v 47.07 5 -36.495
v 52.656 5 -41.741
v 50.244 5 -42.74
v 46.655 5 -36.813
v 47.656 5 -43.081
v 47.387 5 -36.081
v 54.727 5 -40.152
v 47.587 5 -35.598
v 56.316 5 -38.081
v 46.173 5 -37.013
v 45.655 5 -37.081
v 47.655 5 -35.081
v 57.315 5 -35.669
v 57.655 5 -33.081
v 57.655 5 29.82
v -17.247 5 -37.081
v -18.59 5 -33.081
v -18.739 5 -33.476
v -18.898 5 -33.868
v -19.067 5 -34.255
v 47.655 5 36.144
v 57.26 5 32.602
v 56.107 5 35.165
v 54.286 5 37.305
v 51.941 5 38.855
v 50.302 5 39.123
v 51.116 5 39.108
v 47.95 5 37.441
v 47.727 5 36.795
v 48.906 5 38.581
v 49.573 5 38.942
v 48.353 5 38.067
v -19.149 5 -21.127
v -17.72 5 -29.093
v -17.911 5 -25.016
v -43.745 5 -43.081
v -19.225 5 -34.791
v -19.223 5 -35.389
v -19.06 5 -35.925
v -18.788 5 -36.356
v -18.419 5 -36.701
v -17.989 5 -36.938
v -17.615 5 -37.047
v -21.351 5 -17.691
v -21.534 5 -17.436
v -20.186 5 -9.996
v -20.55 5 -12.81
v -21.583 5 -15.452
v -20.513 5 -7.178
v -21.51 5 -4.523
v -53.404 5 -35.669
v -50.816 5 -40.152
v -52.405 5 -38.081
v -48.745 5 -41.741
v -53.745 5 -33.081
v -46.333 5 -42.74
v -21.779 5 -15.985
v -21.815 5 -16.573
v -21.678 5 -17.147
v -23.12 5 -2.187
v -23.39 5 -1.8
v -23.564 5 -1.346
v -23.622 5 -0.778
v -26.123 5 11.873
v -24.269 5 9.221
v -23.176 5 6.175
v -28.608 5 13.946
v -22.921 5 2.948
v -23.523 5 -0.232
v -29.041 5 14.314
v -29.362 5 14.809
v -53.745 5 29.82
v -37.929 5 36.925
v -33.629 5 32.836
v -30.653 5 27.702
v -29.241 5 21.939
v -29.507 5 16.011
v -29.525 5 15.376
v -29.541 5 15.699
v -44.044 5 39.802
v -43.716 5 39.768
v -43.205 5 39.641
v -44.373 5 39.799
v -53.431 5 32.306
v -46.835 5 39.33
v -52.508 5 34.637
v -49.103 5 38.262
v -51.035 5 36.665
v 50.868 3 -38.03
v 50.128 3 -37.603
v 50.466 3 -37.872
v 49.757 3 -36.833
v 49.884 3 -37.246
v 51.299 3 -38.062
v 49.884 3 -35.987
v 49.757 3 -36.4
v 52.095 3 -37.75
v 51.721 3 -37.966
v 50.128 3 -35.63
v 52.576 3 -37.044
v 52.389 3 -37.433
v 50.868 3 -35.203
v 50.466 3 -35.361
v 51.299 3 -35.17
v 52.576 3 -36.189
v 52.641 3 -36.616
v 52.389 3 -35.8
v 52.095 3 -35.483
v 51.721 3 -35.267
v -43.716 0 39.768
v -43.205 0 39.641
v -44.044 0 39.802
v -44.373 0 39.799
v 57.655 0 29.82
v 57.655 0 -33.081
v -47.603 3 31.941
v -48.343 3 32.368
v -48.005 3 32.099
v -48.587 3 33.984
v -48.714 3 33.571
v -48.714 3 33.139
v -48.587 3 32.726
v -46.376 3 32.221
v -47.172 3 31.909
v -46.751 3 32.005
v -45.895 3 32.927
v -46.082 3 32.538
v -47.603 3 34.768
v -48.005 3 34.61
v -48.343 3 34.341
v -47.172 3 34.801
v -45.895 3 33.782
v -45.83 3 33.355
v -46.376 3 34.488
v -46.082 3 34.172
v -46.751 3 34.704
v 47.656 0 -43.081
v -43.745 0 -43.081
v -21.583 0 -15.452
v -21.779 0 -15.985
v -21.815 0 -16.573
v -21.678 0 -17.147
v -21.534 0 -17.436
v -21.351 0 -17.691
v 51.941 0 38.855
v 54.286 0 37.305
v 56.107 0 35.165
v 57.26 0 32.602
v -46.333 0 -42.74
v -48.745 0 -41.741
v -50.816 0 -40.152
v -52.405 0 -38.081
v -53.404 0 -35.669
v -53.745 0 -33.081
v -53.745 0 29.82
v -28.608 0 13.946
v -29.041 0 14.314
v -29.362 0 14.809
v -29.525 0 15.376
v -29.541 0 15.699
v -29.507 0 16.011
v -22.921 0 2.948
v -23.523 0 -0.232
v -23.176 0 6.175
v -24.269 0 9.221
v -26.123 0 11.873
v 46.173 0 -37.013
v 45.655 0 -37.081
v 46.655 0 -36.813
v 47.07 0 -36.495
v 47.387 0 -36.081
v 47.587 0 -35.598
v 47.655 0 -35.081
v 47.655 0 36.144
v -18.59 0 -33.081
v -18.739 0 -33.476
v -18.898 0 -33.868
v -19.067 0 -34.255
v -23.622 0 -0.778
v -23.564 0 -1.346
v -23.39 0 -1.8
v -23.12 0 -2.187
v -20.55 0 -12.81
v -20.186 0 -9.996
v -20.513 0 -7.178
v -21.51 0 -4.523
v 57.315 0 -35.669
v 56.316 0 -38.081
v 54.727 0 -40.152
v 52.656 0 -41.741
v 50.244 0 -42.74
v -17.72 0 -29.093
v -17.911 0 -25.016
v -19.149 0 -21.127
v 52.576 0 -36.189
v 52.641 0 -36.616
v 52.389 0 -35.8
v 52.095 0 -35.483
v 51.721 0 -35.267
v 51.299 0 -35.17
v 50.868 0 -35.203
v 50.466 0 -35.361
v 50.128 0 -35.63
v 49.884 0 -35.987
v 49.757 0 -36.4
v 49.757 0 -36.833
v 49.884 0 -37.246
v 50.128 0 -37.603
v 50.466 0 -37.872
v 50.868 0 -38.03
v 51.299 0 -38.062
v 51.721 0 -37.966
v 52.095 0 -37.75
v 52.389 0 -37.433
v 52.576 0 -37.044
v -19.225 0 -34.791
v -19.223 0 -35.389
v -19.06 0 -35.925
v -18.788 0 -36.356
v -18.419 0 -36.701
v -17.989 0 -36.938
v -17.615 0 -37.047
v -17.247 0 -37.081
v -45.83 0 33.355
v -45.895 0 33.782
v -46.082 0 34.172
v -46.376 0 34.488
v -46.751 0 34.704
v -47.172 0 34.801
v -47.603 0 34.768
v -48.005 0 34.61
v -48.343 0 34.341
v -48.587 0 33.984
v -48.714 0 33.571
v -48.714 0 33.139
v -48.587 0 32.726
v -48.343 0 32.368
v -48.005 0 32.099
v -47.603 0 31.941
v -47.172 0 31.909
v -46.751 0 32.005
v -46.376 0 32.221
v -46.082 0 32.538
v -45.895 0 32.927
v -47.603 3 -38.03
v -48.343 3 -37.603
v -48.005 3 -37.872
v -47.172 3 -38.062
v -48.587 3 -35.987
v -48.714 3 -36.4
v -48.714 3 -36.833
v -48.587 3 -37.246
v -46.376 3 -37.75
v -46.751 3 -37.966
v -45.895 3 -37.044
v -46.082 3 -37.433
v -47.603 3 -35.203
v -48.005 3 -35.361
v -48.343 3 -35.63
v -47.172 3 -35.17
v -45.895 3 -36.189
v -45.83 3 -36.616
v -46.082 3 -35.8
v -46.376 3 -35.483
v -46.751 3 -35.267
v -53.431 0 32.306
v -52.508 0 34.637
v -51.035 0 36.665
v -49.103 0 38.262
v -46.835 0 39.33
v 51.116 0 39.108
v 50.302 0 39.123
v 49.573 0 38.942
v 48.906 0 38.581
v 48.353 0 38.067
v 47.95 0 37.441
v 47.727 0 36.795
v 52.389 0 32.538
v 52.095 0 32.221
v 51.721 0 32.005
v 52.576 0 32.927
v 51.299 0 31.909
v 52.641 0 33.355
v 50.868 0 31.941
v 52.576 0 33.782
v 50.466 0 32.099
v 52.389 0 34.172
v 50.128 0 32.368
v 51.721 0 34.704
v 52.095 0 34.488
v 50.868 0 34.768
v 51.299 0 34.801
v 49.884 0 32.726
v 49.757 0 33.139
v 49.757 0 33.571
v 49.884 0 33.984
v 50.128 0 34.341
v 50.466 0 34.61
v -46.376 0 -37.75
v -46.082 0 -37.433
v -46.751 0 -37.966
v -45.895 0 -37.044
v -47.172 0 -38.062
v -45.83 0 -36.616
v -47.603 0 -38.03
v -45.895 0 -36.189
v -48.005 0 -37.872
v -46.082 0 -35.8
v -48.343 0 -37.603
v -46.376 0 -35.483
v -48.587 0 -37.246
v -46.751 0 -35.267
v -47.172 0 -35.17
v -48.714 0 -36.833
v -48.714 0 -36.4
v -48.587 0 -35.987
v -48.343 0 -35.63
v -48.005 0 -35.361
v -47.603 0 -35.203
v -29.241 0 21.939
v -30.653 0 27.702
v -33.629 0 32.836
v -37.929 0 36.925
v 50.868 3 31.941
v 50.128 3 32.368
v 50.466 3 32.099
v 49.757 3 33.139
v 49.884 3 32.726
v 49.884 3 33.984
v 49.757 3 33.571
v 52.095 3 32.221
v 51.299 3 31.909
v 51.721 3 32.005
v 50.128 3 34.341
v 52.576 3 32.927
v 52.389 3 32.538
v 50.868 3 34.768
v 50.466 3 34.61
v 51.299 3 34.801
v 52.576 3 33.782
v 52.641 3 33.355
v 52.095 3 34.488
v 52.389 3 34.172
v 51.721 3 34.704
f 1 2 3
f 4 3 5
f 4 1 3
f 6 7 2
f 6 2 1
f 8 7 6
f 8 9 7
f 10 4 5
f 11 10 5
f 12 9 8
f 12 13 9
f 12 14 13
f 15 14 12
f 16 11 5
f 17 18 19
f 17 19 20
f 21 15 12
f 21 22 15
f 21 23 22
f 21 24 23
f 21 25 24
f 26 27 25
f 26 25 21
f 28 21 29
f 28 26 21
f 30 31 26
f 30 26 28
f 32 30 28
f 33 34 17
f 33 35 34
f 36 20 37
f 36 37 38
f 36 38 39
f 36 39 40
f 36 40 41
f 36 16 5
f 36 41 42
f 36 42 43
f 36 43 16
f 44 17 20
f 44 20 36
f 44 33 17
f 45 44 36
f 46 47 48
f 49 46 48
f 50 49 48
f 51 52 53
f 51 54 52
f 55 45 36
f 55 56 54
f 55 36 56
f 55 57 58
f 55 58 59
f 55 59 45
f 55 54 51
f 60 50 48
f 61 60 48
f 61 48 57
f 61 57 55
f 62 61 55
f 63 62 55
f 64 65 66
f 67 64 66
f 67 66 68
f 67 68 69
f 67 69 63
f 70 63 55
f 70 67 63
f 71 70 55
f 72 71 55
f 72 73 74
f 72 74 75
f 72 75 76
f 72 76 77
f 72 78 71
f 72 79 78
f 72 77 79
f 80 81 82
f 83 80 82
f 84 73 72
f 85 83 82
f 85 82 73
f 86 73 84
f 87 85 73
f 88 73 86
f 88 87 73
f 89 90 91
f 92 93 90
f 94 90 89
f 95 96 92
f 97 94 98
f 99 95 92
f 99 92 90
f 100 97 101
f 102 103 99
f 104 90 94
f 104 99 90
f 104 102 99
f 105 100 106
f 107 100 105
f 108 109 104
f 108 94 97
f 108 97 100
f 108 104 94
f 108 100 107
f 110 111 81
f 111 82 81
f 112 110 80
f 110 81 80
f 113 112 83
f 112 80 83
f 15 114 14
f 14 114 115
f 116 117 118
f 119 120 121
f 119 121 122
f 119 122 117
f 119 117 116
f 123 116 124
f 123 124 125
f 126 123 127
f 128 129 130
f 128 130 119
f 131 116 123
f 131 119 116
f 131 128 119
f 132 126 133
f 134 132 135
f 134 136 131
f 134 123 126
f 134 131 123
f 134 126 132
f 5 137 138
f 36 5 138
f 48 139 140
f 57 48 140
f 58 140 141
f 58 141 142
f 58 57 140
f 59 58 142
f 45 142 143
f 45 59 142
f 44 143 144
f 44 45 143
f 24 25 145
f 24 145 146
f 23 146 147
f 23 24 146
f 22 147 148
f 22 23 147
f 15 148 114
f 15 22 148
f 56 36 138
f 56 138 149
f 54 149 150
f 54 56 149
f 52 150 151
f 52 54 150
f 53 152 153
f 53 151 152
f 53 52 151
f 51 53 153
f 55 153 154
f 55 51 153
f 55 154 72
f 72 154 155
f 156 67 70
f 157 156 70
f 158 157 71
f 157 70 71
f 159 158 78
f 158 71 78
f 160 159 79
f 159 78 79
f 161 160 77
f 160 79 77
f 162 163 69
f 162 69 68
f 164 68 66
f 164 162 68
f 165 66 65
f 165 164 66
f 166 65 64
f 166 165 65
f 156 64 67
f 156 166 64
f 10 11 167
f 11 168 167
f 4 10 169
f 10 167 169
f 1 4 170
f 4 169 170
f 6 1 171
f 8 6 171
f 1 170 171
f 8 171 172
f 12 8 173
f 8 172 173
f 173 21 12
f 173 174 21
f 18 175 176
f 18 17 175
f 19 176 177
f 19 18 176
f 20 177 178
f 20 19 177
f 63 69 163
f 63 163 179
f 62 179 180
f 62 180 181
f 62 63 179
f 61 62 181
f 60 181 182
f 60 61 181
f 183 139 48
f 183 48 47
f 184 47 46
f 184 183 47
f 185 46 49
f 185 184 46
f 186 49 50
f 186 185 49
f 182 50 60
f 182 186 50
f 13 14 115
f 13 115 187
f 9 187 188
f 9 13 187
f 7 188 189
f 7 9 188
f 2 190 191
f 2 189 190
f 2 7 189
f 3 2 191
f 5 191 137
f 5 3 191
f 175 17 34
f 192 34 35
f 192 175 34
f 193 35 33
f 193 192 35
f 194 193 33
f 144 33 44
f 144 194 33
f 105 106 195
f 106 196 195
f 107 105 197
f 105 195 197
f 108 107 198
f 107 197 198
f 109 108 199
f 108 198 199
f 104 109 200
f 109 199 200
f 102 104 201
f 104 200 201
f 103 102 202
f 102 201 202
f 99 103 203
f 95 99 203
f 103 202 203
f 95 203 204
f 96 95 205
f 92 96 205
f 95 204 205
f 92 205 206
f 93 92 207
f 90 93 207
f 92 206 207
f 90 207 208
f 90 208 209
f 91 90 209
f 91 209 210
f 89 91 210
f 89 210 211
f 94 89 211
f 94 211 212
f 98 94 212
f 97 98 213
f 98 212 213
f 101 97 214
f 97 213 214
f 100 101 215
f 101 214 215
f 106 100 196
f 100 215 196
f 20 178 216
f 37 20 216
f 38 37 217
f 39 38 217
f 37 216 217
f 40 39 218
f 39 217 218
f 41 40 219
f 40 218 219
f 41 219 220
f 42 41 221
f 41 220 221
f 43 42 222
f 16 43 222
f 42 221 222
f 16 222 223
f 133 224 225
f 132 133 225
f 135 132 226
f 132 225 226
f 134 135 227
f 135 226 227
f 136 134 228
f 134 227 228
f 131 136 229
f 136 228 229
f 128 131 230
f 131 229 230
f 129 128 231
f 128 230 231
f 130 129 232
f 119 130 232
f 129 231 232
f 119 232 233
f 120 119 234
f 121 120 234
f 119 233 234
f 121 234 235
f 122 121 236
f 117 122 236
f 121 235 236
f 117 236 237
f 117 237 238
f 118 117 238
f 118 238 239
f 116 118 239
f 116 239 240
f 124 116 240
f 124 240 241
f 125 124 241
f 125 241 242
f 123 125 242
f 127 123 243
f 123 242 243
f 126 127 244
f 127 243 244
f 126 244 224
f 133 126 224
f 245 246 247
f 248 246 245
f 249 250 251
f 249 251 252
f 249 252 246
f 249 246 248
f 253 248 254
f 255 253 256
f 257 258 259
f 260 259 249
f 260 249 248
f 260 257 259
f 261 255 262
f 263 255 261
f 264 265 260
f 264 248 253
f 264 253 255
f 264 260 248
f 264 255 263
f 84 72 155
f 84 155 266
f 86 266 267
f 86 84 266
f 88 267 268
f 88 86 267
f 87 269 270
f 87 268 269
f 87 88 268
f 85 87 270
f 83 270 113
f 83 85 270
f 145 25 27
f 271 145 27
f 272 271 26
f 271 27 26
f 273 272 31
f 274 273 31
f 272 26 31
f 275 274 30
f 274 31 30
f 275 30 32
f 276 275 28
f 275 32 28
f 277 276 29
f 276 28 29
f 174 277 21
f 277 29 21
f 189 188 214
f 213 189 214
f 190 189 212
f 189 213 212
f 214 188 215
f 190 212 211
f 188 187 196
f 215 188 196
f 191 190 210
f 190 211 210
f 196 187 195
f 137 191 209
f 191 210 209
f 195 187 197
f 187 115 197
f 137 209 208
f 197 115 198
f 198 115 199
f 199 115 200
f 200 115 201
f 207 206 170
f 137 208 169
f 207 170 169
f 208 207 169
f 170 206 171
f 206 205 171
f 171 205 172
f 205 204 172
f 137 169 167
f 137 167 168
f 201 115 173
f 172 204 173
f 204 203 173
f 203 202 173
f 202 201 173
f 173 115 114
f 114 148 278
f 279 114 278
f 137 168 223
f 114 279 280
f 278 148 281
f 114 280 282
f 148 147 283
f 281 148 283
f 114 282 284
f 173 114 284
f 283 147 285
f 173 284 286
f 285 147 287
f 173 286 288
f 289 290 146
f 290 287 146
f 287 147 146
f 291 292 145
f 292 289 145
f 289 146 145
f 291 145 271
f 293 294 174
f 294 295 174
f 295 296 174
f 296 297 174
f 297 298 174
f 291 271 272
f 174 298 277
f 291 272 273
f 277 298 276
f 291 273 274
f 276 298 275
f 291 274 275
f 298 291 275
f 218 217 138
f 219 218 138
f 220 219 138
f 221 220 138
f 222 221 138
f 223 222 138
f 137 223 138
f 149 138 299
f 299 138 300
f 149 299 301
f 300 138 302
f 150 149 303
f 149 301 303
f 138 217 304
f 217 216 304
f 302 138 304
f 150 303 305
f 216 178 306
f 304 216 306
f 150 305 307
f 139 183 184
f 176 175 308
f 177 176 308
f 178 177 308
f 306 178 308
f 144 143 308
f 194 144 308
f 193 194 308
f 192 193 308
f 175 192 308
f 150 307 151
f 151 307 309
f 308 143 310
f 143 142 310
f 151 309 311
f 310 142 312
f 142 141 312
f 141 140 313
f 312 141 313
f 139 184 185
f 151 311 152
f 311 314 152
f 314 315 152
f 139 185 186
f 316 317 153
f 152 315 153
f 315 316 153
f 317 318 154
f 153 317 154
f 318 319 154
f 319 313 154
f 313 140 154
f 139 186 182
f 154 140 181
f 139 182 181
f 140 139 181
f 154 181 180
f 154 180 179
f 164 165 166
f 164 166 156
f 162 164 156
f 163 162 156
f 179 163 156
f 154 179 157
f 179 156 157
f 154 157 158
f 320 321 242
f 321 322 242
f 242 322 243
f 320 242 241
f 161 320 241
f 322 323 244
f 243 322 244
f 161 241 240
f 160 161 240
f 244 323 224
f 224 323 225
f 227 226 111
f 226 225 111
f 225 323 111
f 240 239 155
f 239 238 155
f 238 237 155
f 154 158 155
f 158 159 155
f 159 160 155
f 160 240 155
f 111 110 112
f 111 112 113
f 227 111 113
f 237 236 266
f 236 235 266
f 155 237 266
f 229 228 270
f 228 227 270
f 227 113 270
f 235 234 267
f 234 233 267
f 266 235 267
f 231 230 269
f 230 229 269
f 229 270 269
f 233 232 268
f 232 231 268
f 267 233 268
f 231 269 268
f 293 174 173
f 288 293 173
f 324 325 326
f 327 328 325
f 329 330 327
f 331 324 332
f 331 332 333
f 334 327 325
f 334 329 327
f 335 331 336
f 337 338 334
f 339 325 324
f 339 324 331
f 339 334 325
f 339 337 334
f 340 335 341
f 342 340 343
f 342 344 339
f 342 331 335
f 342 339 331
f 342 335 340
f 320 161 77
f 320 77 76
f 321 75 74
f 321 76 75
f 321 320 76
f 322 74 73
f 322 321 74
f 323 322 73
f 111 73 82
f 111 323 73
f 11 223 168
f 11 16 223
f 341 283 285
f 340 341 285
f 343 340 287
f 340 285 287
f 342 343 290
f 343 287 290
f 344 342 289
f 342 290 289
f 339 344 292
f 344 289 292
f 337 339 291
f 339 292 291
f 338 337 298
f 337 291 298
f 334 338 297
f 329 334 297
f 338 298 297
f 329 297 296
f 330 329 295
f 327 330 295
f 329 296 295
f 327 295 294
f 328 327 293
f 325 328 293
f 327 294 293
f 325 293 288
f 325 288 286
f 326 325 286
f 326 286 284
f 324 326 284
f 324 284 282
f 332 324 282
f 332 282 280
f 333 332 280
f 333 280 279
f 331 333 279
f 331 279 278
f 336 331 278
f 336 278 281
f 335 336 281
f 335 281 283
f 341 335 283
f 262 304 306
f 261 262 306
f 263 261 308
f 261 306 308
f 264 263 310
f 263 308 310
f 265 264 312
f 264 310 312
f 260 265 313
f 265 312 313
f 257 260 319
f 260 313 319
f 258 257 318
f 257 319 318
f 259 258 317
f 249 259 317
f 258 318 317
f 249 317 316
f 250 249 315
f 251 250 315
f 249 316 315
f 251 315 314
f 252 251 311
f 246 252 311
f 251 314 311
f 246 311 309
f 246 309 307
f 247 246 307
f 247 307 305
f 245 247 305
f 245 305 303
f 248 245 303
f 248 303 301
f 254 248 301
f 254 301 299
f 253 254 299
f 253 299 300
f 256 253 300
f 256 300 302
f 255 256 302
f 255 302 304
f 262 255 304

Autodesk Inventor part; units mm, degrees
ref_plane "YZ Plane" through (0, 0, 0) normal (1, 0, 0) x (0, 1, 0)
ref_plane "XZ Plane" through (0, 0, 0) normal (0, 1, 0) x (-1, 0, 0)
ref_plane "XY Plane" through (0, 0, 0) normal (0, 0, 1) x (1, 0, 0)
sketch "Sketch1" plane through (0, 0, 0) normal (0, 1, 0) x (-1, 0, 0)
  line L0 (43.7447, 29.8192) -> (-47.6553, 29.8192)
  line L1 (-47.6553, 29.8192) -> (-47.6553, -33.0808)
  line L2 (-47.6553, -33.0808) -> (43.7447, -33.0808)
  line L3 (43.7447, -33.0808) -> (43.7447, 29.8192)
  line L4 (53.7447, 39.8192) -> (-57.6553, 39.8192)
  line L5 (-57.6553, 39.8192) -> (-57.6553, -43.0808)
  line L6 (-57.6553, -43.0808) -> (53.7447, -43.0808)
  line L7 (53.7447, -43.0808) -> (53.7447, 39.8192)
  line L8 (43.7447, 29.8192) -> (43.7447, 39.8192)
  line L9 (-47.6553, 29.8192) -> (-47.6553, 39.8192)
  line L10 (43.7447, -25.8728) -> (15.7447, -25.8728)
  arc A0 (22.3207, -16.6423) -> (18.5901, -33.0808) centre (33.3129, -27.7795) ccw
  arc A1 (23.9512, -1.3415) -> (22.3207, -16.6423) centre (31.8383, -9.9192) ccw
  arc A2 (29.8207, 14.6173) -> (23.9512, -1.3415) centre (35.1226, 3.6085) ccw
  arc A3 (43.7447, 39.8192) -> (29.8207, 14.6173) centre (50.0285, 19.8999) ccw
  point P0 (0, 0)
  point P1 (42.359, 39.8192)
  point P2 (31.6472, 29.8192)
  dimension "d0" = 91.4
  dimension "d1" = 62.9
  dimension "d2" = 10
  dimension "d17" = 28
extrude "Extrusion1" add sketch "Sketch1" along normal blind 5 contours L3 L10 A0 A1 A2 A3 L0 | L8 L4 L7 L6 L5 L9 L1 L2 L3 | L0 A3 L8 | L3 L2 A0 L10
fillet "Fillet1" radius 10 4 edges at (57.6553, 2.5, 39.8192) (-53.7447, 2.5, 39.8192) (57.6553, 2.5, -43.0808) (-53.7447, 2.5, -43.0808)
sketch "Sketch2" plane through (0, 0, 0) normal (0, -1, 0) x (1, 0, 0)
  arc A0 (-53.7447, -33.0808) -> (-43.7447, -43.0808) centre (-43.7447, -33.0808) ccw projected
  line L0 (47.6553, -43.0808) -> (-43.7447, -43.0808) projected
  arc A1 (47.6553, -43.0808) -> (57.6553, -33.0808) centre (47.6553, -33.0808) ccw projected
  line L1 (57.6553, 29.8192) -> (57.6553, -33.0808) projected
  arc A2 (57.6553, 29.8192) -> (47.6553, 39.8192) centre (47.6553, 29.8192) ccw projected
  arc A3 (-43.7447, 39.8192) -> (-53.7447, 29.8192) centre (-43.7447, 29.8192) ccw projected
  line L2 (-53.7447, -33.0808) -> (-53.7447, 29.8192) projected
  line L3 (47.6553, -33.0808) -> (47.6553, 39.8192) projected
  line L4 (54.7263, 36.8902) -> (51.1908, 33.3547)
  line L5 (54.7263, -40.1519) -> (51.1908, -36.6164)
  line L6 (-50.8158, 36.8902) -> (-47.2803, 33.3547)
  line L7 (-50.8158, -40.1519) -> (-47.2803, -36.6164)
  circle A4 centre (-47.2803, -36.6164) radius 1.45
  circle A5 centre (-47.2803, 33.3547) radius 1.45
  circle A6 centre (51.1908, 33.3547) radius 1.45
  circle A7 centre (51.1908, -36.6164) radius 1.45
  arc A8 (-29.8207, 14.6173) -> (-43.7447, 39.8192) centre (-50.0285, 19.8999) ccw projected
  line L8 (-18.5901, -33.0808) -> (47.6553, -33.0808) projected
  arc A9 (-18.5901, -33.0808) -> (-22.3207, -16.6423) centre (-33.3129, -27.7795) ccw projected
  arc A10 (-22.3207, -16.6423) -> (-23.9512, -1.3415) centre (-31.8383, -9.9192) ccw projected
  arc A11 (-23.9512, -1.3415) -> (-29.8207, 14.6173) centre (-35.1226, 3.6085) ccw projected
  point P0 (0, 0)
  dimension "d6" = 5
  dimension "d7" = 5
  dimension "d8" = 5
  dimension "d9" = 5
  dimension "d10" = 2.9
  dimension "d11" = 2.9
  dimension "d12" = 2.9
  dimension "d13" = 2.9
extrude "Extrusion2" cut sketch "Sketch2" against normal blind 3 contours A4 | A7 | A6 | A5
fillet "Fillet2" radius 3 4 edges at (-43.7447, 2.5, 39.8192) (-43.7452, 2.5, 39.8192) (47.6558, 2.5, 39.8192) (47.6553, 2.5, 39.8192)
sketch "Sketch3" plane through (0, 5, 0) normal (0, 1, 0) x (1, 0, 0)
  arc A0 (-22.3207, 16.6423) -> (-18.5901, 33.0808) centre (-33.3129, 27.7795) ccw projected
  circle A1 centre (-33.3129, 27.7795) radius 15.6482
  line L0 (-18.5901, 33.0808) -> (47.6553, 33.0808) projected
  line L1 (47.6553, 33.0808) -> (-20.0549, 33.0808)
  line L2 (-20.0549, 33.0808) -> (-20.0549, 37.0808)
  line L3 (-20.0549, 37.0808) -> (47.6553, 37.0808)
  line L4 (47.6553, 37.0808) -> (47.6553, 33.0808)
  point P0 (0, 0)
  point P1 (-20.0549, 36.0916)
  dimension "d18" = 4
extrude "Extrusion3" cut sketch "Sketch3" against normal blind 10 contours L2 L3 L4 L0 A1
fillet "Fillet3" radius 2 6 edges at (-20.0549, 2.5, -37.0808) (-20.0549, 2.5, -36.0916) (47.6553, 2.5, -37.0808) (-29.8207, 2.5, 14.6173) (-23.9512, 2.5, -1.3415) (-22.3207, 2.5, -16.6423)
properties part number "Top"
